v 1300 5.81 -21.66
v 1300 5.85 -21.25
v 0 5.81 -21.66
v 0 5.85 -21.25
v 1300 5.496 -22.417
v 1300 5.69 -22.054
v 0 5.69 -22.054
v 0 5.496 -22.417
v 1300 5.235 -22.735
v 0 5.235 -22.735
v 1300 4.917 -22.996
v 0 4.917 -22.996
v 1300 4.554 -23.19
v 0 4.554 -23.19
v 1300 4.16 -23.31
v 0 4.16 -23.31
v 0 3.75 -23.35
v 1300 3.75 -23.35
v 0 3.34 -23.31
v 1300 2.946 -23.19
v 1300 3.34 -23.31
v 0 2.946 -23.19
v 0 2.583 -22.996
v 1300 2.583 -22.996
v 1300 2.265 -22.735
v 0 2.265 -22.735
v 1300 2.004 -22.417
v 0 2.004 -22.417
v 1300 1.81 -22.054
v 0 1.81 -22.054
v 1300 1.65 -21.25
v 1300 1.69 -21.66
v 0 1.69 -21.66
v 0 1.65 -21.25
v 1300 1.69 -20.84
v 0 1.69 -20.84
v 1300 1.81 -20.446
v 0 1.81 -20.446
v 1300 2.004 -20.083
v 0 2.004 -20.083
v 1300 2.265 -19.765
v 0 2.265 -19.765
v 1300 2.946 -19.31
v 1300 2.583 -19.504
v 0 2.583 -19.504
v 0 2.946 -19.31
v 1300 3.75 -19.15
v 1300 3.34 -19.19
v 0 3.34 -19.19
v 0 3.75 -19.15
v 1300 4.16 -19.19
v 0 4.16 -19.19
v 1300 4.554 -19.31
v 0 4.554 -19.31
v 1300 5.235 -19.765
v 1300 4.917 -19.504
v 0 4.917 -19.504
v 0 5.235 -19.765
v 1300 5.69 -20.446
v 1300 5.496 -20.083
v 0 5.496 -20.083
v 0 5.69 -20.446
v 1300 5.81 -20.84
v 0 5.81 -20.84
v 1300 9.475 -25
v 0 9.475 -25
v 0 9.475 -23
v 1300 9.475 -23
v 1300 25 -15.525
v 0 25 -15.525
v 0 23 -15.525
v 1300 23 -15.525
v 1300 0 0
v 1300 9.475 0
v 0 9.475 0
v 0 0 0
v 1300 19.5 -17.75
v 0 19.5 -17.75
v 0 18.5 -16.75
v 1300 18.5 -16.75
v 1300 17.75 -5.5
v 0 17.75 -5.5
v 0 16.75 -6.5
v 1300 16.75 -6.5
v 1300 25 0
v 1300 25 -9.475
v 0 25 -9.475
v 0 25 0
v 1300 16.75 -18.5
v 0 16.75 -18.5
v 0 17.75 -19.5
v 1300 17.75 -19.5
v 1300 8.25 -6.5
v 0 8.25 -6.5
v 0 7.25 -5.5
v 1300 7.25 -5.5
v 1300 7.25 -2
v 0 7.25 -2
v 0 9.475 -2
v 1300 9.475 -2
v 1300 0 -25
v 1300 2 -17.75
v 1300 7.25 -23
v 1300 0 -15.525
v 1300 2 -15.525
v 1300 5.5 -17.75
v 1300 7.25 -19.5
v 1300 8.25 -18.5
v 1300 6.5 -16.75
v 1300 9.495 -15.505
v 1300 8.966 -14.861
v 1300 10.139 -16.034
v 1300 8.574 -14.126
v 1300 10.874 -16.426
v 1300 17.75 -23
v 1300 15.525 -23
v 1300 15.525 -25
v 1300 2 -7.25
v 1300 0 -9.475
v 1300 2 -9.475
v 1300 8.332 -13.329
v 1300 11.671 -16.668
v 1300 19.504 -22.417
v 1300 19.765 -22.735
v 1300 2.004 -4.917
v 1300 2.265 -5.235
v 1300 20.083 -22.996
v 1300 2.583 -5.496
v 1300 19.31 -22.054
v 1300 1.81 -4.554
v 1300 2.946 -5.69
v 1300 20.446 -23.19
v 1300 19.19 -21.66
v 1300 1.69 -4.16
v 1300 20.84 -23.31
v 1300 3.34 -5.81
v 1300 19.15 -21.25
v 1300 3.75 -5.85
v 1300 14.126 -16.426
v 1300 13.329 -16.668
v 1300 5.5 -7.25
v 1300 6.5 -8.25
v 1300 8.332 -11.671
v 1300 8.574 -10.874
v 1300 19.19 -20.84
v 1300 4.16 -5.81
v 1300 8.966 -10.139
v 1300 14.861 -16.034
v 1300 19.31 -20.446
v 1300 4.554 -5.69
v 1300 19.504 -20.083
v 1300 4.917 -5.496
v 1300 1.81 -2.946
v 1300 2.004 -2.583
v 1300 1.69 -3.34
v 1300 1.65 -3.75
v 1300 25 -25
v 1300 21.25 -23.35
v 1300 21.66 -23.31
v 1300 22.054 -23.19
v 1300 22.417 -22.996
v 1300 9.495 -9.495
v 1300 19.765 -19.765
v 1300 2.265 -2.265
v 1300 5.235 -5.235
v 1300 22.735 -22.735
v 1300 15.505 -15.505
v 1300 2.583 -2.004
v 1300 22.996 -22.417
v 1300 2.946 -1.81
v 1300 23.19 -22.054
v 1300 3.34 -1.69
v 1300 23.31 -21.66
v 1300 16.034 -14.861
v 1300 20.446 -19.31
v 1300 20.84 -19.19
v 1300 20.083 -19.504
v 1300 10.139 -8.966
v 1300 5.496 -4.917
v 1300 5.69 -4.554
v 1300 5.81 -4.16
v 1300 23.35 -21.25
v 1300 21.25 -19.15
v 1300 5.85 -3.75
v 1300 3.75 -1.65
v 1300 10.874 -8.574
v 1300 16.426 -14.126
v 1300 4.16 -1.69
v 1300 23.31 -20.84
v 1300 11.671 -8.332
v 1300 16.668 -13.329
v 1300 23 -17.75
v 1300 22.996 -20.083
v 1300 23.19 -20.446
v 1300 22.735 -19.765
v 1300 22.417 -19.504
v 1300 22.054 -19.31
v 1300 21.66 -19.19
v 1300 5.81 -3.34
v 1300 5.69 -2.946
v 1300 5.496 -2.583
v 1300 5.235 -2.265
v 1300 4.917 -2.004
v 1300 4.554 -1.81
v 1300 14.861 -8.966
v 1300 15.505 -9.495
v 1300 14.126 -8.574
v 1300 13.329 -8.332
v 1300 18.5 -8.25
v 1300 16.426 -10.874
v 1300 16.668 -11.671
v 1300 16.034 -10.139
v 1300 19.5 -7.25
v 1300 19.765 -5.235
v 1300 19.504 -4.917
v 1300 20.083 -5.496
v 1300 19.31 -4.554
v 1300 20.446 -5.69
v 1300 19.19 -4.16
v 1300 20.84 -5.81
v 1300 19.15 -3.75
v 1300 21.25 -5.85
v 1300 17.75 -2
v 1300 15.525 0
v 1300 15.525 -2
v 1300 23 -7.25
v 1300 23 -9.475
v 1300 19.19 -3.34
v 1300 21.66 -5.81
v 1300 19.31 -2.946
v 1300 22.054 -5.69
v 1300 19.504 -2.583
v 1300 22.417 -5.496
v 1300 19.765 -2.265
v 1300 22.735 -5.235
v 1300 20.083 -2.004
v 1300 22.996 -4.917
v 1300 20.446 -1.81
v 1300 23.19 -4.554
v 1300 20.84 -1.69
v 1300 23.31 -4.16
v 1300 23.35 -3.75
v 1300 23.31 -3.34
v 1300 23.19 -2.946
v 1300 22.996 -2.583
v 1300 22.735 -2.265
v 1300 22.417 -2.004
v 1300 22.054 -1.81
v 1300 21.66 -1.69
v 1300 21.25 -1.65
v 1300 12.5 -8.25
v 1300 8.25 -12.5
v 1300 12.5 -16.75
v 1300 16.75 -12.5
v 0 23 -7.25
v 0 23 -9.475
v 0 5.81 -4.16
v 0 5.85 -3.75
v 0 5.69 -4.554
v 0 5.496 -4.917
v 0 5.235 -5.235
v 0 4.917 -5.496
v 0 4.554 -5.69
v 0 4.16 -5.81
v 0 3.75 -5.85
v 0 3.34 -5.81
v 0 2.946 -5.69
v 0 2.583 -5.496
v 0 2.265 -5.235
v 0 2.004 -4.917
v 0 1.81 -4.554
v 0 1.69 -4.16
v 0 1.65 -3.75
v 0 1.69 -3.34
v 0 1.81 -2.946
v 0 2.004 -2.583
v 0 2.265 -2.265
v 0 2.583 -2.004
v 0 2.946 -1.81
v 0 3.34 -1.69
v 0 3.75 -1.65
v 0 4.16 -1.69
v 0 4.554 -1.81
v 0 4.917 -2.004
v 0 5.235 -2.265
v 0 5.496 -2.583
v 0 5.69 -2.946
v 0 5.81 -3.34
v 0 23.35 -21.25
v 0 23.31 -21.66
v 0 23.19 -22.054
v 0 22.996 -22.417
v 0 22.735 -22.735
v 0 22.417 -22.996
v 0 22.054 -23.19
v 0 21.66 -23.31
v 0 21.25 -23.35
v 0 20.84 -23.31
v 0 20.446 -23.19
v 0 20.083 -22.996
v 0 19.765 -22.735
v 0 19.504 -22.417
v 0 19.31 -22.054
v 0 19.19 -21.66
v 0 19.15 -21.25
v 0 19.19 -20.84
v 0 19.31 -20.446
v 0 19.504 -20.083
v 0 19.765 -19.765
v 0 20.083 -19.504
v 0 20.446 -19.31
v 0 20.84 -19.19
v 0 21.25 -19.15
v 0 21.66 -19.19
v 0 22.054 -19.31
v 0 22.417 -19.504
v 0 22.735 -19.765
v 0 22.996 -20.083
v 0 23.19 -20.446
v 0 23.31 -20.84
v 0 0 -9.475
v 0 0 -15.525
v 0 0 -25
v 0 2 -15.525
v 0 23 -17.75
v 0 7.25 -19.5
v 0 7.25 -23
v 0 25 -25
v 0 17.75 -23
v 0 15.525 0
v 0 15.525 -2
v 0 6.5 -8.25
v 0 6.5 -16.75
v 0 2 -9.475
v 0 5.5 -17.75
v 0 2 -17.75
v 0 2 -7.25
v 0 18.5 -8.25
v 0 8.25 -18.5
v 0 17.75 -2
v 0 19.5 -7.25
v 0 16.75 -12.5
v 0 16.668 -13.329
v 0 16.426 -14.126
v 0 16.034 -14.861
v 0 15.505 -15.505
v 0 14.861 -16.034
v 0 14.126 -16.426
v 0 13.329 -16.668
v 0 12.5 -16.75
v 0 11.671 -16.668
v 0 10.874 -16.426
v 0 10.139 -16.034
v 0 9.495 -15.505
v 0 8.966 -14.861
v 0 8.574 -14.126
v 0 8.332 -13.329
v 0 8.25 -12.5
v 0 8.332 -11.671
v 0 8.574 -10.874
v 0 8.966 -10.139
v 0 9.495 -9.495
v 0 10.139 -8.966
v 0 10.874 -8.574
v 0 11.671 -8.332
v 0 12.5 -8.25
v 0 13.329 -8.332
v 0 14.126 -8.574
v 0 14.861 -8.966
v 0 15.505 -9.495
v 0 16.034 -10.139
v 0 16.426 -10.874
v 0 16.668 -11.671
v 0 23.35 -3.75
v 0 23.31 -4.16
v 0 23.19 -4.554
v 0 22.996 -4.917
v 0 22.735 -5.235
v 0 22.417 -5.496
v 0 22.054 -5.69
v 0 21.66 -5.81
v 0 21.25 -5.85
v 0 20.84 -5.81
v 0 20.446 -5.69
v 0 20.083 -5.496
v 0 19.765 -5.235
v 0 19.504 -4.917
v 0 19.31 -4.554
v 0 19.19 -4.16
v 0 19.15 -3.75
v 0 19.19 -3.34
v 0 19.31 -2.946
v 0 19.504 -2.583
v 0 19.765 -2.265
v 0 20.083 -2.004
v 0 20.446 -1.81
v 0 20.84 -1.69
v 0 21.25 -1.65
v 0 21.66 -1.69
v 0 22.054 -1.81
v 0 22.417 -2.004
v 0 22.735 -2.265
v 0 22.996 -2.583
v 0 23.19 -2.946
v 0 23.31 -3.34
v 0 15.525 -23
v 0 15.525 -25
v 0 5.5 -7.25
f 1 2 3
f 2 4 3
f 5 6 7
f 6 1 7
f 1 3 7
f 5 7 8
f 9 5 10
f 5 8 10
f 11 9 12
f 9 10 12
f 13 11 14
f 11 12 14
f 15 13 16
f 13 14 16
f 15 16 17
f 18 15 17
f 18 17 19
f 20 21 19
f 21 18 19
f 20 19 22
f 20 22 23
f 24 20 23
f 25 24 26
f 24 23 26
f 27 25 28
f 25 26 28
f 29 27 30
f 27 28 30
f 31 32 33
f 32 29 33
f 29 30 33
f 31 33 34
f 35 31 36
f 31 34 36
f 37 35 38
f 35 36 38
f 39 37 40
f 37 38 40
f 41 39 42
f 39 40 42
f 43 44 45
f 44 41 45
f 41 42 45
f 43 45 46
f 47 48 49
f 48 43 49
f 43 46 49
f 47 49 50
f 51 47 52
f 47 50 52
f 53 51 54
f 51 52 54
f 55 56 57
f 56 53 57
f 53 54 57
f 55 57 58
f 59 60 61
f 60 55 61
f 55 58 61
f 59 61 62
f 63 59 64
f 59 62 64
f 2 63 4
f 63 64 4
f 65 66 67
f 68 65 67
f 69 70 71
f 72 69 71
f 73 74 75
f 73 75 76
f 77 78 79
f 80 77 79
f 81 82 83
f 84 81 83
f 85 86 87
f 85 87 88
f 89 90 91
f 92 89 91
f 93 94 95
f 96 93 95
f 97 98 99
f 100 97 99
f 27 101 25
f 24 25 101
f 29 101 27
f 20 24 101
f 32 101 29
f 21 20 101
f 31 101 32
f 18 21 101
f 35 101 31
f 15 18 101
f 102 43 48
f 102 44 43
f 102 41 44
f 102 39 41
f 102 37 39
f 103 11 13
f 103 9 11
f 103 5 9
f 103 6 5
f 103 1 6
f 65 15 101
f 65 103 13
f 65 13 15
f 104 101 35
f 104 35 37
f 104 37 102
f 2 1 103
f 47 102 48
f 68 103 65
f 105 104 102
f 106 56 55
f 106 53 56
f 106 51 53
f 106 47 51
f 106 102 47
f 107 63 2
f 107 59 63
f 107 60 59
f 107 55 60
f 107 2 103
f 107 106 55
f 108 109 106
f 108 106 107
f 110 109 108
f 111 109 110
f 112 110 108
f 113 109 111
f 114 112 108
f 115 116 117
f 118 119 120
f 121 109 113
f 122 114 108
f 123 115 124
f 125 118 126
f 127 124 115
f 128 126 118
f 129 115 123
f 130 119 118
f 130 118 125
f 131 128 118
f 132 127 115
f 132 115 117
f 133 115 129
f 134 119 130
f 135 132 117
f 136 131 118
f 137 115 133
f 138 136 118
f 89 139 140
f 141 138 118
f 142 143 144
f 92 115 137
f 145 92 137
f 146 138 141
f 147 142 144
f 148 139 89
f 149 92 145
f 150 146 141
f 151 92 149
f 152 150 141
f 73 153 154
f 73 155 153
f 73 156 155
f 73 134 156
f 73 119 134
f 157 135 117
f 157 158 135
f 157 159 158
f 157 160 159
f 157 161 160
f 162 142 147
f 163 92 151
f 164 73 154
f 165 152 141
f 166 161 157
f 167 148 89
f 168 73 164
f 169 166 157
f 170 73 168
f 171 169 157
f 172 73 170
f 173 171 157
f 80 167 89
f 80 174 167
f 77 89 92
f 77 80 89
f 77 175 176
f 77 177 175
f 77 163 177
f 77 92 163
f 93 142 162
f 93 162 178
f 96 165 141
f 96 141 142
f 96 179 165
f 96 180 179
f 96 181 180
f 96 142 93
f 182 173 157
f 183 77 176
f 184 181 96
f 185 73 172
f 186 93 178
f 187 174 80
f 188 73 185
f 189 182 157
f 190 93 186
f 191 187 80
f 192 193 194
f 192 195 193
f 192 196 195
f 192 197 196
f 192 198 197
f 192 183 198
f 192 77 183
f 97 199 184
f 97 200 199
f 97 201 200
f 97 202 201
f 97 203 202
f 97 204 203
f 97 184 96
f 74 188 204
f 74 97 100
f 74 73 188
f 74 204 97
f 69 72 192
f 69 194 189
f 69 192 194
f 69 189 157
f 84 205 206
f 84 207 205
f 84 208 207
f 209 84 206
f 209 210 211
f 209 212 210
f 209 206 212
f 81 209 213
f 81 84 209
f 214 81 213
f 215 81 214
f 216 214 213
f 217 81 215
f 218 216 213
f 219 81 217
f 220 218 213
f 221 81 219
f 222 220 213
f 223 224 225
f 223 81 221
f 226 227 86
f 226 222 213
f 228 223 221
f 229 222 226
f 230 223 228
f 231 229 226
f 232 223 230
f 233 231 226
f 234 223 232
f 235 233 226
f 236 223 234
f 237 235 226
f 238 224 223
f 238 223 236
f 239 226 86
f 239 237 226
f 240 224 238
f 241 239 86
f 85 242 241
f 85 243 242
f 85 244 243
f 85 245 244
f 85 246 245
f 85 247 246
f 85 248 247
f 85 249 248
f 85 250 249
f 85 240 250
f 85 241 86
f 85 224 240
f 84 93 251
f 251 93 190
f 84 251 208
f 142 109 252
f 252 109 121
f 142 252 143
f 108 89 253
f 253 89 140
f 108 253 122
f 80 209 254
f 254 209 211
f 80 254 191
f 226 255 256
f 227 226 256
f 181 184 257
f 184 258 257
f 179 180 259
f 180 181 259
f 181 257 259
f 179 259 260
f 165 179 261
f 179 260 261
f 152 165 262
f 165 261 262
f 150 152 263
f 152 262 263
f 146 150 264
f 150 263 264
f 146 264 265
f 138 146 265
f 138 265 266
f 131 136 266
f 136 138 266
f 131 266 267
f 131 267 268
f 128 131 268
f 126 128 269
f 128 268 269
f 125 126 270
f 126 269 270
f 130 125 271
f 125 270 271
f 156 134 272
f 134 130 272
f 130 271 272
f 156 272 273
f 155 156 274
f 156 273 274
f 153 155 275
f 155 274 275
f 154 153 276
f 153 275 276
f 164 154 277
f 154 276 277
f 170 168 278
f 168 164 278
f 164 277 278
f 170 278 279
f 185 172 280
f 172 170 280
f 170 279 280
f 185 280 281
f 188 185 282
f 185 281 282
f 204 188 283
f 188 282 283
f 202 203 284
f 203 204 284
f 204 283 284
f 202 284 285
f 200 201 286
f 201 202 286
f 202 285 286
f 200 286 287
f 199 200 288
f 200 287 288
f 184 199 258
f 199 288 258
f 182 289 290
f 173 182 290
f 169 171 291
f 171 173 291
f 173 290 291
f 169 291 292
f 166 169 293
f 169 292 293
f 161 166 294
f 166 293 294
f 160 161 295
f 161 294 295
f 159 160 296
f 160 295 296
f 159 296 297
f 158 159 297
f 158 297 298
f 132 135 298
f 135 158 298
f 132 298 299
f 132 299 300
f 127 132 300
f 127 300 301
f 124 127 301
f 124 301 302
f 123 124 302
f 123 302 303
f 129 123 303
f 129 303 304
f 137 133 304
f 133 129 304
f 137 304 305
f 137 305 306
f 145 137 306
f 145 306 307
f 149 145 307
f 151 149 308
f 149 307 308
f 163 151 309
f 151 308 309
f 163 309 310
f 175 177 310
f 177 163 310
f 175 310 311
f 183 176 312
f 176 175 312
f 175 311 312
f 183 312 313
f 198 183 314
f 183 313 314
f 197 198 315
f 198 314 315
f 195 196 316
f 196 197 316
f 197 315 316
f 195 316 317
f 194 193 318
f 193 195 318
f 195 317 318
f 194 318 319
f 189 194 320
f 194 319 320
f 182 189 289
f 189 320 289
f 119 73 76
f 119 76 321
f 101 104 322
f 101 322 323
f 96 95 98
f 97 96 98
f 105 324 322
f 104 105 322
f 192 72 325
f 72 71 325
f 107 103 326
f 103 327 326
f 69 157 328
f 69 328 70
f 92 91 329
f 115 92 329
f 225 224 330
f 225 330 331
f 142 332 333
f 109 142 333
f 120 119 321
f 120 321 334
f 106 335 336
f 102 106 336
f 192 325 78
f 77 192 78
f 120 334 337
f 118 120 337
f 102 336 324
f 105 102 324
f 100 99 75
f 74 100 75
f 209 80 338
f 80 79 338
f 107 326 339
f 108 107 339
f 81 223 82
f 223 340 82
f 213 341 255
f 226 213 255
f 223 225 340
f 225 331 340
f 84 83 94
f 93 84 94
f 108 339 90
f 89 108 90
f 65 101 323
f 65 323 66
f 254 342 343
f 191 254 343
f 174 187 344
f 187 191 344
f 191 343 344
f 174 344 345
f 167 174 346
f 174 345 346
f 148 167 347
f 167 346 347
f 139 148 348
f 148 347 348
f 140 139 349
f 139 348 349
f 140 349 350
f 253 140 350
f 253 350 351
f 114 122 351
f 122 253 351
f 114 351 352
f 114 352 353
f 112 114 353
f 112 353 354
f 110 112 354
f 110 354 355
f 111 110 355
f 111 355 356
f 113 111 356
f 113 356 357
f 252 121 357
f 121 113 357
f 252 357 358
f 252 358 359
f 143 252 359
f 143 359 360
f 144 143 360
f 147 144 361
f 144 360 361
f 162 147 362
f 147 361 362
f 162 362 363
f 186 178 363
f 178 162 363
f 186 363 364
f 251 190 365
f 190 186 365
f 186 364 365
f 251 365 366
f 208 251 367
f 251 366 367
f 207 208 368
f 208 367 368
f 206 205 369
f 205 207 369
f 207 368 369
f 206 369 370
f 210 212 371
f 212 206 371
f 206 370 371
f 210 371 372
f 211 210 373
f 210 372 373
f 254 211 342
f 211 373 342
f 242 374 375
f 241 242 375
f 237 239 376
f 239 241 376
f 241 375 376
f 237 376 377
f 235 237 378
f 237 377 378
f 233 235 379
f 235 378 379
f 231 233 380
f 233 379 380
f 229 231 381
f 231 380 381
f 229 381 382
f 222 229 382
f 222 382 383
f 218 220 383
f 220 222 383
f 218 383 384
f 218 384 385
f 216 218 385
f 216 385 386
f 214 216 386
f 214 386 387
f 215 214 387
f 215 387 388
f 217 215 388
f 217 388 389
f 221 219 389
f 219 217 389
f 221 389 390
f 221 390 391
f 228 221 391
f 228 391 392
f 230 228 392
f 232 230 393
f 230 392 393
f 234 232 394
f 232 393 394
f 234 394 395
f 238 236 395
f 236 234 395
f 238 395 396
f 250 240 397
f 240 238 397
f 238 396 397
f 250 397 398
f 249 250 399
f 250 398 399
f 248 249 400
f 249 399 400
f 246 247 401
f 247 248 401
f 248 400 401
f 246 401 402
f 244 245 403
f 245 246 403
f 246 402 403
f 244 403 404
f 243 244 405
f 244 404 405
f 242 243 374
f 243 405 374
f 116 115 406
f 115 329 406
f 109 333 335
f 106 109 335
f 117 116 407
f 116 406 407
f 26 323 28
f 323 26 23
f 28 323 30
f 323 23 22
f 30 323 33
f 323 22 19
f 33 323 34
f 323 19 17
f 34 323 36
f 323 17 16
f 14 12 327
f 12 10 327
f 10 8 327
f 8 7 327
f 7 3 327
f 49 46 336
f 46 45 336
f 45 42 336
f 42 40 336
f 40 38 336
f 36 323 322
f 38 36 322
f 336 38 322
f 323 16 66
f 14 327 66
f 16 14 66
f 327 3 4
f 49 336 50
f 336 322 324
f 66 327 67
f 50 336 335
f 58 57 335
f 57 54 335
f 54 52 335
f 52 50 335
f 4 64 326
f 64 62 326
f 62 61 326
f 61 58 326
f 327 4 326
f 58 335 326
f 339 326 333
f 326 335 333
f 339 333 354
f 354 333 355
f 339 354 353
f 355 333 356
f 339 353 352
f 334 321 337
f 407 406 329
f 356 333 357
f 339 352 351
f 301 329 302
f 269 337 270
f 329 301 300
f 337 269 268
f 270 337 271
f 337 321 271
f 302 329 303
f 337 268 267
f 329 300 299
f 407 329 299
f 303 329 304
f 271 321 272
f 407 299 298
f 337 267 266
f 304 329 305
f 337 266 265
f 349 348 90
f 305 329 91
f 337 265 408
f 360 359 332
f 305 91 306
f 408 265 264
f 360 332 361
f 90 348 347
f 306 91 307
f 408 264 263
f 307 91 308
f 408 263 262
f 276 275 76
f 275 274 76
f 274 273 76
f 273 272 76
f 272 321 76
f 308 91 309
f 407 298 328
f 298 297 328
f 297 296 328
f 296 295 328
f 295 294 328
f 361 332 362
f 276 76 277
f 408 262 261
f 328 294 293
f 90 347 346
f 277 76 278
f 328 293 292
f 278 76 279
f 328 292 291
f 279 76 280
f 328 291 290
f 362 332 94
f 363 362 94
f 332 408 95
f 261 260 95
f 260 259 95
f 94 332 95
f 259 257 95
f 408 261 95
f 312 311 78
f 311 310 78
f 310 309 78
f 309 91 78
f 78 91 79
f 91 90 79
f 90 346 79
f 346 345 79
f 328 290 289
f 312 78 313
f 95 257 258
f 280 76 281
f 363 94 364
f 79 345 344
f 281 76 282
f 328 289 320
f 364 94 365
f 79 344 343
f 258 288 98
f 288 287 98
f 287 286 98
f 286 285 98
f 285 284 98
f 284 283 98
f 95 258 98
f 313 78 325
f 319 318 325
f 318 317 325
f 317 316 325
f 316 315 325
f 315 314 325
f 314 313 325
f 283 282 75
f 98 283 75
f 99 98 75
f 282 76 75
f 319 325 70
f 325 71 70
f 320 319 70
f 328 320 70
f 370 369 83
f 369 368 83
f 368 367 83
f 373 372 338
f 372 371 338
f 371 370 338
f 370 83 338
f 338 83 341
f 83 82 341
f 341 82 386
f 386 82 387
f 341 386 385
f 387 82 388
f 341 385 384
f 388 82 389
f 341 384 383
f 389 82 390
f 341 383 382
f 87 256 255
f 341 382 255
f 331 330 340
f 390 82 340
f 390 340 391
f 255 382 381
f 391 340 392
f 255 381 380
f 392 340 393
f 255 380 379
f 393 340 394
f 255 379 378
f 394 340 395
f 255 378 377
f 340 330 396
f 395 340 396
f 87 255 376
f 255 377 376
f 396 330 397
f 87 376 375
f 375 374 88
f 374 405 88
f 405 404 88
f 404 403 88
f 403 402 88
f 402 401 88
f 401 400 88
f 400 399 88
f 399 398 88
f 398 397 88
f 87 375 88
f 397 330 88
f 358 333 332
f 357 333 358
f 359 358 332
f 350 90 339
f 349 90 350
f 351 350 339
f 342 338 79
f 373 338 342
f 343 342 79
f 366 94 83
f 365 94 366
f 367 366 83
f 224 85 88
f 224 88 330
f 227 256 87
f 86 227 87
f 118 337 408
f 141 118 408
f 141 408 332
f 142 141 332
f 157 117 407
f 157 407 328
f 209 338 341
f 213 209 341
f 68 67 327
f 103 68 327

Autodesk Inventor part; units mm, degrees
ref_plane "YZ Plane" through (0, 0, 0) normal (1, 0, 0) x (0, 1, 0)
ref_plane "XZ Plane" through (0, 0, 0) normal (0, 1, 0) x (-1, 0, 0)
ref_plane "XY Plane" through (0, 0, 0) normal (0, 0, 1) x (1, 0, 0)
sketch "Skizze_1" plane through (0, 0, 0) normal (1, 0, 0) x (0, 1, 0)
  line L0 (0, 0) -> (0, -9.475)
  line L1 (0, -9.475) -> (2, -9.475)
  line L2 (2, -9.475) -> (2, -7.25)
  line L3 (2, -7.25) -> (5.5, -7.25)
  line L4 (5.5, -7.25) -> (6.5, -8.25)
  line L5 (6.5, -8.25) -> (6.5, -16.75)
  line L6 (6.5, -16.75) -> (5.5, -17.75)
  line L7 (5.5, -17.75) -> (2, -17.75)
  line L8 (2, -17.75) -> (2, -15.525)
  line L9 (2, -15.525) -> (0, -15.525)
  line L10 (0, -15.525) -> (0, -25)
  line L11 (0, -25) -> (9.475, -25)
  line L12 (9.475, -25) -> (9.475, -23)
  line L13 (9.475, -23) -> (7.25, -23)
  line L14 (7.25, -23) -> (7.25, -19.5)
  line L15 (7.25, -19.5) -> (8.25, -18.5)
  line L16 (8.25, -18.5) -> (16.75, -18.5)
  line L17 (16.75, -18.5) -> (17.75, -19.5)
  line L18 (17.75, -19.5) -> (17.75, -23)
  line L19 (17.75, -23) -> (15.525, -23)
  line L20 (15.525, -23) -> (15.525, -25)
  line L21 (15.525, -25) -> (25, -25)
  line L22 (25, -25) -> (25, -15.525)
  line L23 (25, -15.525) -> (23, -15.525)
  line L24 (23, -15.525) -> (23, -17.75)
  line L25 (23, -17.75) -> (19.5, -17.75)
  line L26 (19.5, -17.75) -> (18.5, -16.75)
  line L27 (18.5, -16.75) -> (18.5, -8.25)
  line L28 (18.5, -8.25) -> (19.5, -7.25)
  line L29 (19.5, -7.25) -> (23, -7.25)
  line L30 (23, -7.25) -> (23, -9.475)
  line L31 (23, -9.475) -> (25, -9.475)
  line L32 (25, -9.475) -> (25, 0)
  line L33 (25, 0) -> (15.525, 0)
  line L34 (15.525, 0) -> (15.525, -2)
  line L35 (15.525, -2) -> (17.75, -2)
  line L36 (17.75, -2) -> (17.75, -5.5)
  line L37 (17.75, -5.5) -> (16.75, -6.5)
  line L38 (16.75, -6.5) -> (8.25, -6.5)
  line L39 (8.25, -6.5) -> (7.25, -5.5)
  line L40 (7.25, -5.5) -> (7.25, -2)
  line L41 (7.25, -2) -> (9.475, -2)
  line L42 (9.475, -2) -> (9.475, 0)
  line L43 (9.475, 0) -> (0, 0)
  circle A0 centre (3.75, -21.25) radius 2.1
  circle A1 centre (21.25, -21.25) radius 2.1
  circle A2 centre (12.5, -12.5) radius 4.25
  circle A3 centre (3.75, -3.75) radius 2.1
  circle A4 centre (21.25, -3.75) radius 2.1
extrude "Extrusion1" add sketch "Skizze_1" along normal blind 1300
equation "\"d0\" = L"
equation "\"L\" = 1300"
properties part number "25.01.1300(00-00-0)(0)"
